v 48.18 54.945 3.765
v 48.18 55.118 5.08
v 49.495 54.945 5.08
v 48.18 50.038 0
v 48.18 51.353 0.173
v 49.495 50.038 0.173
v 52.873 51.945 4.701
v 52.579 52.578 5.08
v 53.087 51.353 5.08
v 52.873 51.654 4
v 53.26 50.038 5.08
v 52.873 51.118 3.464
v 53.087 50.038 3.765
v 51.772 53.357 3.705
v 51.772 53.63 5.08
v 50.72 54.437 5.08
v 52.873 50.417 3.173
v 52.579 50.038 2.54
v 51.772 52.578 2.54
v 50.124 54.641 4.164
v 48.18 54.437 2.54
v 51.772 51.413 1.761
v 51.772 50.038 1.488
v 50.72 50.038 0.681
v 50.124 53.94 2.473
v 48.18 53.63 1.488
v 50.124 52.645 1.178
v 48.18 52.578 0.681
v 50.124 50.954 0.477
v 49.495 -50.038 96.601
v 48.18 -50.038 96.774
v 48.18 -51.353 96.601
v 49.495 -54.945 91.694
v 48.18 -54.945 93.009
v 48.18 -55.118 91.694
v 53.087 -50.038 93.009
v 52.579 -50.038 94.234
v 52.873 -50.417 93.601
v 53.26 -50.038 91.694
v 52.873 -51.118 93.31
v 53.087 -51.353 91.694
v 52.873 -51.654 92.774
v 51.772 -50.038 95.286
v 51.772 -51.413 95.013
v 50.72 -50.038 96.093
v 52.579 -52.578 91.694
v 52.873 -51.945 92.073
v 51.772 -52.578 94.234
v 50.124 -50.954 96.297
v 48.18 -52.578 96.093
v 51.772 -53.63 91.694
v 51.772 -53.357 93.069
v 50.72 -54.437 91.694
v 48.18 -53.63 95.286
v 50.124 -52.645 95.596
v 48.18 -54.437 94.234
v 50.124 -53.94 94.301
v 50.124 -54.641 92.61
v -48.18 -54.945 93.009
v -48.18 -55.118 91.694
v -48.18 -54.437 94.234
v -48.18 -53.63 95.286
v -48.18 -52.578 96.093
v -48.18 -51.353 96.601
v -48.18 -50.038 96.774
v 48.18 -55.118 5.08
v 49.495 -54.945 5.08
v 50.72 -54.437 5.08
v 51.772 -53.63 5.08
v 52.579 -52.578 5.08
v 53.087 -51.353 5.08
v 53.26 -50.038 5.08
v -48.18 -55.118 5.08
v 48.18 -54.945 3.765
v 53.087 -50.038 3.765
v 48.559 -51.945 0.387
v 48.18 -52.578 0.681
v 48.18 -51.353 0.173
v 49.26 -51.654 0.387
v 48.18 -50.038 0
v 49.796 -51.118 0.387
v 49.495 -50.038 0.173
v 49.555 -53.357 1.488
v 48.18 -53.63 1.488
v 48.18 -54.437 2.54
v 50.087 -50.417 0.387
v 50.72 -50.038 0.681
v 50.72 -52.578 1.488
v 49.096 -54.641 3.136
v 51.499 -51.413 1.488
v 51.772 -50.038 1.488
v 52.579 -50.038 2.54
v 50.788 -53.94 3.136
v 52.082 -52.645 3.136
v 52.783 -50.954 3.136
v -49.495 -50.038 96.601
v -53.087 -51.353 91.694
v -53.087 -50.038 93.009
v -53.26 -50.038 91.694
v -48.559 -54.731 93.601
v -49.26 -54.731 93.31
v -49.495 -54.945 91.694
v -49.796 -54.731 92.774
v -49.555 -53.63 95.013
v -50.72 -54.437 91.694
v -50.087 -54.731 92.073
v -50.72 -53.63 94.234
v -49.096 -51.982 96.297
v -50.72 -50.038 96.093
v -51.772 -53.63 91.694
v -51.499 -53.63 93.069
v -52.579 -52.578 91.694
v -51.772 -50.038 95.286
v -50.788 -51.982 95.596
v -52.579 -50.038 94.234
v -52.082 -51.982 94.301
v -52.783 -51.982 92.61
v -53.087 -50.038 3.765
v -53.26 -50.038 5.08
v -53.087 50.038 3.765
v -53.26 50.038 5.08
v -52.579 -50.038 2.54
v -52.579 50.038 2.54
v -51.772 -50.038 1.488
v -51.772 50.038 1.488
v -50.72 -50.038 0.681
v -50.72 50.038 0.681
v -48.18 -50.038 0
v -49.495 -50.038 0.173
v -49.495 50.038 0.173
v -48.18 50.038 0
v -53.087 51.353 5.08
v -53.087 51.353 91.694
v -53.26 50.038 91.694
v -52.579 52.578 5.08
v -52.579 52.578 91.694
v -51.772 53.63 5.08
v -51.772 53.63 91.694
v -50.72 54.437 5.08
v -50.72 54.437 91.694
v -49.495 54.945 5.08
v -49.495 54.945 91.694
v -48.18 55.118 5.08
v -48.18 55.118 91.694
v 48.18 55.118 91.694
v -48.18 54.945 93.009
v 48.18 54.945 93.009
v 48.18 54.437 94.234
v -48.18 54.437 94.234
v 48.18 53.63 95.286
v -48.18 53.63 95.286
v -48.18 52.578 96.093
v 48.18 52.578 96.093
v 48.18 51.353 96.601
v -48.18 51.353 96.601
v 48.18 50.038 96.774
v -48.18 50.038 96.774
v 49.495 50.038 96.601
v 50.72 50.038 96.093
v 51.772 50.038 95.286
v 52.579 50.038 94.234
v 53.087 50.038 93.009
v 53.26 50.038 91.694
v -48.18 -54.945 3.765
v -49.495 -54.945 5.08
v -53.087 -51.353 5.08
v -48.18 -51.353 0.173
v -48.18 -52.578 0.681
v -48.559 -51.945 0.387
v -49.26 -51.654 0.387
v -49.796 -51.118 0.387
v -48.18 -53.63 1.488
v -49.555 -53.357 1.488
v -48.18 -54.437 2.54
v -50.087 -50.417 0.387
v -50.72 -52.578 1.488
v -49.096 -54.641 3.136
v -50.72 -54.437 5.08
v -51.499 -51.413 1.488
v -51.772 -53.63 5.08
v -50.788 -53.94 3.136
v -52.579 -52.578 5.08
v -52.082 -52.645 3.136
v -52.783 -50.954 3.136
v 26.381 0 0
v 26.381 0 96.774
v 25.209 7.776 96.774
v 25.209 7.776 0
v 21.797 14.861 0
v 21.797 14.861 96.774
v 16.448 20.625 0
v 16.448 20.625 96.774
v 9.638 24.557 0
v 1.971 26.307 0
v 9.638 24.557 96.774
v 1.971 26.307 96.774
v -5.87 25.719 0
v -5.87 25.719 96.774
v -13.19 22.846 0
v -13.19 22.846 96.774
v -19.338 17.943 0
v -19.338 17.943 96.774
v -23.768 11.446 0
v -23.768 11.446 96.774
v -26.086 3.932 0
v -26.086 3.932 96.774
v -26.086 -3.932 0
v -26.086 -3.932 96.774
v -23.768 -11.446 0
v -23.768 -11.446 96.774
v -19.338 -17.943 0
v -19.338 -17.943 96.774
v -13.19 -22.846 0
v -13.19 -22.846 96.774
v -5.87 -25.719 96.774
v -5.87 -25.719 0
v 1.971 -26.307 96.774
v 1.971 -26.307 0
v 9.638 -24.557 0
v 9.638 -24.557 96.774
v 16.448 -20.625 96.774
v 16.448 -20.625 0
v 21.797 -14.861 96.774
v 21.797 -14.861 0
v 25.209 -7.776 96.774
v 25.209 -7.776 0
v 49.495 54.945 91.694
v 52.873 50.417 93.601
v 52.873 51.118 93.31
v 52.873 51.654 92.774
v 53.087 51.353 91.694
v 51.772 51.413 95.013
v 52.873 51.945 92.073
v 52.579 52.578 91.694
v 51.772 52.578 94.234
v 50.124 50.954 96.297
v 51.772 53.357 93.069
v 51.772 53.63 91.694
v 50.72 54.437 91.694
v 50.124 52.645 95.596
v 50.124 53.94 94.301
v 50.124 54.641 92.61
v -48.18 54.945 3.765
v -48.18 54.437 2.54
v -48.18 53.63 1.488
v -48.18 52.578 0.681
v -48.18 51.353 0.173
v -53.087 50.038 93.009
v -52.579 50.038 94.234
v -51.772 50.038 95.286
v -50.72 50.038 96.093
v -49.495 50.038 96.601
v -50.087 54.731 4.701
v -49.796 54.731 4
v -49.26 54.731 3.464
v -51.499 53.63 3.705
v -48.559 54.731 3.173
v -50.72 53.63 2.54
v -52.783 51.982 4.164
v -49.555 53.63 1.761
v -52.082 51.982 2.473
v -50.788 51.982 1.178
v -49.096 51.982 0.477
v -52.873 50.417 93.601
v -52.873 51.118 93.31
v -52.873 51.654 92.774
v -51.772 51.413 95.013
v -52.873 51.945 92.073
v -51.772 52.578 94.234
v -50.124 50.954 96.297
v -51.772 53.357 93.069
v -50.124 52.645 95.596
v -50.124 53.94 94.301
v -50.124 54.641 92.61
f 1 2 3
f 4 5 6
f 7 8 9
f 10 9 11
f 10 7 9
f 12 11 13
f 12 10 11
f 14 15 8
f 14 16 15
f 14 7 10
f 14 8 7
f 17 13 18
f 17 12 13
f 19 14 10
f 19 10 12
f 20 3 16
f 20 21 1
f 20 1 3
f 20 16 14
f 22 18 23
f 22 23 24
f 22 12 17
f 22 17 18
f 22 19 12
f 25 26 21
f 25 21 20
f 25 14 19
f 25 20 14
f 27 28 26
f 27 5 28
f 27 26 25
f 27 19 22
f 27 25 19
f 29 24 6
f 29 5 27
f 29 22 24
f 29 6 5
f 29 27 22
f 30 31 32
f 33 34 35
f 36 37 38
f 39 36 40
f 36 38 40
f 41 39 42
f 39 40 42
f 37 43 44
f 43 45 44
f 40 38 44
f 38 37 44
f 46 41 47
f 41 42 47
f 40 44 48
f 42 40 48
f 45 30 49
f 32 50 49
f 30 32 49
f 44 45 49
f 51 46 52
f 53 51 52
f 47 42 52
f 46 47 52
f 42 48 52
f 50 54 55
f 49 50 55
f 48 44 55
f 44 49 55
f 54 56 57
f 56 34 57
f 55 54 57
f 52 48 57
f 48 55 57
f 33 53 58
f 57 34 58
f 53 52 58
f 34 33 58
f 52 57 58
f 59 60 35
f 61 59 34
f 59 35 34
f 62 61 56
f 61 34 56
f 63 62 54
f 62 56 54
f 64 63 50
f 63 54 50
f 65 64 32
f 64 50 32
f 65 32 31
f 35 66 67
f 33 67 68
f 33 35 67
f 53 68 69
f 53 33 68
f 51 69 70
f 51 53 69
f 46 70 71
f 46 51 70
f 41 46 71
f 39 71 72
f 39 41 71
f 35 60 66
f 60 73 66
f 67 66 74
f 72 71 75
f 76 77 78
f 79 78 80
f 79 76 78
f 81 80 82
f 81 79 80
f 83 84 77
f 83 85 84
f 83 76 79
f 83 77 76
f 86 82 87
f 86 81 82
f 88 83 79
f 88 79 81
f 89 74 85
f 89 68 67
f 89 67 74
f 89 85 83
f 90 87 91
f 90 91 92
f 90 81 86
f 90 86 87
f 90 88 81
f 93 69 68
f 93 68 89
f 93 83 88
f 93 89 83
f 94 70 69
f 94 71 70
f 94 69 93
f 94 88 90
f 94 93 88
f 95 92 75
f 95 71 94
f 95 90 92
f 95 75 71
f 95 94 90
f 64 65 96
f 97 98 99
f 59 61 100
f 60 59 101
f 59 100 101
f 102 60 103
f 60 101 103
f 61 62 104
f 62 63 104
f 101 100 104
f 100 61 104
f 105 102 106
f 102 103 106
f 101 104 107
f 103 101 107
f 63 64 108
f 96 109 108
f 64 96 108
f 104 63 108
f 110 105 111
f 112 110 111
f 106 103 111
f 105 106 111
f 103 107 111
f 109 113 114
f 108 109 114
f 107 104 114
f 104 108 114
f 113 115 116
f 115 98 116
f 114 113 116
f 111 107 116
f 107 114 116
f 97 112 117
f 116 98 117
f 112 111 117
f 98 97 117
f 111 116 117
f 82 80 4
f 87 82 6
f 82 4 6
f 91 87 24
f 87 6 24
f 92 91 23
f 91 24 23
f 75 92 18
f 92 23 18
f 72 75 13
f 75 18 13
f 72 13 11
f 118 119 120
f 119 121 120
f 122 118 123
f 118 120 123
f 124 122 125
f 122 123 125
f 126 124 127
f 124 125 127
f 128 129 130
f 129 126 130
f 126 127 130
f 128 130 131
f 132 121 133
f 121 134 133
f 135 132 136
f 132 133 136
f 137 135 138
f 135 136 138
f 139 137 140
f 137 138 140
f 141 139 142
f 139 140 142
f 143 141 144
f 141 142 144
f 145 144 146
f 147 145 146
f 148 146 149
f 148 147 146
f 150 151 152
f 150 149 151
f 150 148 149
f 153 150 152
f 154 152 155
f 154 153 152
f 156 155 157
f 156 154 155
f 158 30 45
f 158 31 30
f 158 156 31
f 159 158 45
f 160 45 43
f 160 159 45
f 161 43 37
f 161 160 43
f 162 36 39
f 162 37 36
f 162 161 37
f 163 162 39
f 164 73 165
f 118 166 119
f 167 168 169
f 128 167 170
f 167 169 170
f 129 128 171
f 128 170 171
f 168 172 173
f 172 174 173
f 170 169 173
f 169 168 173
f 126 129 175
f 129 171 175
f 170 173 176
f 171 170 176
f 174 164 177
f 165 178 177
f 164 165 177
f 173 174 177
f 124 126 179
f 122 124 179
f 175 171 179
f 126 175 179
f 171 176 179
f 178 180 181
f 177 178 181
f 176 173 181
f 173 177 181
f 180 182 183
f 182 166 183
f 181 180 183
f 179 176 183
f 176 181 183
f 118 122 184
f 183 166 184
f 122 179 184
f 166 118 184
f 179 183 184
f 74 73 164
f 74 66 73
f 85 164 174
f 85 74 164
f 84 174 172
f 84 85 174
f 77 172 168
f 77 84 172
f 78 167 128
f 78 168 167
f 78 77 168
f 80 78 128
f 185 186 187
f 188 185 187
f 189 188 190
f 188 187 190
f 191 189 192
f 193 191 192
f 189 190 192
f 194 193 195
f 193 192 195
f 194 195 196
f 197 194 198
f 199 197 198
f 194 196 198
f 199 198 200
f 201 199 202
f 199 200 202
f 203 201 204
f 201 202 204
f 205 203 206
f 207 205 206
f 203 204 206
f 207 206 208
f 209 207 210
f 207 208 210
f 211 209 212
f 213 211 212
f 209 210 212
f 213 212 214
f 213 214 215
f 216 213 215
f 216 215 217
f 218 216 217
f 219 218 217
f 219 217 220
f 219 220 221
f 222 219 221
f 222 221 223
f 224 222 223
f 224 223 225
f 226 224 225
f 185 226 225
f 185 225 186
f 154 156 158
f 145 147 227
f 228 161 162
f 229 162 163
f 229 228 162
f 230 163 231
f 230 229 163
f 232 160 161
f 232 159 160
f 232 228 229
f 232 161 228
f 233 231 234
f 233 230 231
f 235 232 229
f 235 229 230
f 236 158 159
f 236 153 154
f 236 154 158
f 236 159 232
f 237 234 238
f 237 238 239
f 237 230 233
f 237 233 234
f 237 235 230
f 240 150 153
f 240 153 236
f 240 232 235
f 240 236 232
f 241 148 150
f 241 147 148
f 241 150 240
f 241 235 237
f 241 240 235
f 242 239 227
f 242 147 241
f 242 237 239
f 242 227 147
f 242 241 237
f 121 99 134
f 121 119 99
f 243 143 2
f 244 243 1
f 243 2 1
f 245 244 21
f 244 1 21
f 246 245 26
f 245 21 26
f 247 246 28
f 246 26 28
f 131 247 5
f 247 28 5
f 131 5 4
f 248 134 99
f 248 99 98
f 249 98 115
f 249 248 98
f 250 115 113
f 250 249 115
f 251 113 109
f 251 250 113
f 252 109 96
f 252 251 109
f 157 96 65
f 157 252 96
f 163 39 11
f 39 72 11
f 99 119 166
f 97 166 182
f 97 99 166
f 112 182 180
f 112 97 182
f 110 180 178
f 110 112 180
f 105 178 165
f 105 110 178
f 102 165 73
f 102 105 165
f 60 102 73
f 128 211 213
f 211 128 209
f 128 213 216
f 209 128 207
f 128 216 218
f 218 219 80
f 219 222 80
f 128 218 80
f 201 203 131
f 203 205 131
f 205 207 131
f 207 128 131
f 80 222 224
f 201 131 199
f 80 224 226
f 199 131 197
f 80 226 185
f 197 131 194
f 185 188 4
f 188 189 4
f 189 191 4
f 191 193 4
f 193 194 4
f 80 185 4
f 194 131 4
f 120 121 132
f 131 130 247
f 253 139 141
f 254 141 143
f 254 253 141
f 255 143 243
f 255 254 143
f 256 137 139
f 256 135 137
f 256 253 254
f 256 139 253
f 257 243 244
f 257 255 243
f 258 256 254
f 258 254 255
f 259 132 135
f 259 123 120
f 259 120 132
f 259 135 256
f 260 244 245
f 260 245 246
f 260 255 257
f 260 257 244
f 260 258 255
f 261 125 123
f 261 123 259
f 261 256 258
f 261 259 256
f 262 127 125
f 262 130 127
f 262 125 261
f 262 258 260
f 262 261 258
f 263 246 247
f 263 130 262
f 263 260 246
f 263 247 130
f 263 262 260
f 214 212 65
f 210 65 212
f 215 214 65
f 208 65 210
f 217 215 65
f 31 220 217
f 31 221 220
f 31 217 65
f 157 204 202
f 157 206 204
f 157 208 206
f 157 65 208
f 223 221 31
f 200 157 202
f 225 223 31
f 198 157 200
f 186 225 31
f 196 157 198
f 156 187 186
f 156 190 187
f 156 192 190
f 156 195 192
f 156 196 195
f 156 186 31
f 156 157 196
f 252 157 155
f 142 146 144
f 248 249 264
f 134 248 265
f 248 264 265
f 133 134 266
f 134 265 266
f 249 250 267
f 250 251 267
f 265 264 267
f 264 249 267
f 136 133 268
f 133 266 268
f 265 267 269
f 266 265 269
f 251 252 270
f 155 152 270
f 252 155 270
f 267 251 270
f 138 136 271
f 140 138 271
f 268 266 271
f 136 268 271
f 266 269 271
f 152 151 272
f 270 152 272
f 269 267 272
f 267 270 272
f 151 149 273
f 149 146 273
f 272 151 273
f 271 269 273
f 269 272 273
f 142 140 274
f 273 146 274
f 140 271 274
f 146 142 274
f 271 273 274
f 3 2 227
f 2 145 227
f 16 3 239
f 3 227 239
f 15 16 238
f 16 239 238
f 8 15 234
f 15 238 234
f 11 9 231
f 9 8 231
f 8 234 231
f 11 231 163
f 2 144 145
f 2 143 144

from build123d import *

# Parameters (mm, degrees)
F0_W     = 106.52008
F0_H     = 110.235908
F1_DEPTH = 96.774
F2_R     = 26.380543
F3_DEPTH = 130.81
F4_R     = 5.08


with BuildPart() as f1:
    # F0 (on Top) → F1 (new body)
    with BuildSketch(Plane.XY):
        Rectangle(F0_W, F0_H)
    extrude(amount=F1_DEPTH)

    # F2 (on face) → F3 (cut)
    with BuildSketch(Plane.XY.offset(96.774)):
        Circle(F2_R)
    extrude(amount=-F3_DEPTH, mode=Mode.SUBTRACT)

    # F4
    f4_edges = [f1.edges().sort_by_distance(p)[0] for p in [
        (0, 55.117954, 96.774),
        (-53.26004, 0, 96.774),
        (0, -55.117954, 96.774),
        (53.26004, 0, 96.774),
        (53.26004, -55.117954, 48.387),
        (-53.26004, -55.117954, 48.387),
        (0, -55.117954, 0),
        (-53.26004, 0, 0),
        (-53.26004, 55.117954, 48.387),
        (0, 55.117954, 0),
        (53.26004, 55.117954, 48.387),
        (53.26004, 0, 0),
    ]]
    fillet(f4_edges, radius=F4_R)


solid = f1.part
